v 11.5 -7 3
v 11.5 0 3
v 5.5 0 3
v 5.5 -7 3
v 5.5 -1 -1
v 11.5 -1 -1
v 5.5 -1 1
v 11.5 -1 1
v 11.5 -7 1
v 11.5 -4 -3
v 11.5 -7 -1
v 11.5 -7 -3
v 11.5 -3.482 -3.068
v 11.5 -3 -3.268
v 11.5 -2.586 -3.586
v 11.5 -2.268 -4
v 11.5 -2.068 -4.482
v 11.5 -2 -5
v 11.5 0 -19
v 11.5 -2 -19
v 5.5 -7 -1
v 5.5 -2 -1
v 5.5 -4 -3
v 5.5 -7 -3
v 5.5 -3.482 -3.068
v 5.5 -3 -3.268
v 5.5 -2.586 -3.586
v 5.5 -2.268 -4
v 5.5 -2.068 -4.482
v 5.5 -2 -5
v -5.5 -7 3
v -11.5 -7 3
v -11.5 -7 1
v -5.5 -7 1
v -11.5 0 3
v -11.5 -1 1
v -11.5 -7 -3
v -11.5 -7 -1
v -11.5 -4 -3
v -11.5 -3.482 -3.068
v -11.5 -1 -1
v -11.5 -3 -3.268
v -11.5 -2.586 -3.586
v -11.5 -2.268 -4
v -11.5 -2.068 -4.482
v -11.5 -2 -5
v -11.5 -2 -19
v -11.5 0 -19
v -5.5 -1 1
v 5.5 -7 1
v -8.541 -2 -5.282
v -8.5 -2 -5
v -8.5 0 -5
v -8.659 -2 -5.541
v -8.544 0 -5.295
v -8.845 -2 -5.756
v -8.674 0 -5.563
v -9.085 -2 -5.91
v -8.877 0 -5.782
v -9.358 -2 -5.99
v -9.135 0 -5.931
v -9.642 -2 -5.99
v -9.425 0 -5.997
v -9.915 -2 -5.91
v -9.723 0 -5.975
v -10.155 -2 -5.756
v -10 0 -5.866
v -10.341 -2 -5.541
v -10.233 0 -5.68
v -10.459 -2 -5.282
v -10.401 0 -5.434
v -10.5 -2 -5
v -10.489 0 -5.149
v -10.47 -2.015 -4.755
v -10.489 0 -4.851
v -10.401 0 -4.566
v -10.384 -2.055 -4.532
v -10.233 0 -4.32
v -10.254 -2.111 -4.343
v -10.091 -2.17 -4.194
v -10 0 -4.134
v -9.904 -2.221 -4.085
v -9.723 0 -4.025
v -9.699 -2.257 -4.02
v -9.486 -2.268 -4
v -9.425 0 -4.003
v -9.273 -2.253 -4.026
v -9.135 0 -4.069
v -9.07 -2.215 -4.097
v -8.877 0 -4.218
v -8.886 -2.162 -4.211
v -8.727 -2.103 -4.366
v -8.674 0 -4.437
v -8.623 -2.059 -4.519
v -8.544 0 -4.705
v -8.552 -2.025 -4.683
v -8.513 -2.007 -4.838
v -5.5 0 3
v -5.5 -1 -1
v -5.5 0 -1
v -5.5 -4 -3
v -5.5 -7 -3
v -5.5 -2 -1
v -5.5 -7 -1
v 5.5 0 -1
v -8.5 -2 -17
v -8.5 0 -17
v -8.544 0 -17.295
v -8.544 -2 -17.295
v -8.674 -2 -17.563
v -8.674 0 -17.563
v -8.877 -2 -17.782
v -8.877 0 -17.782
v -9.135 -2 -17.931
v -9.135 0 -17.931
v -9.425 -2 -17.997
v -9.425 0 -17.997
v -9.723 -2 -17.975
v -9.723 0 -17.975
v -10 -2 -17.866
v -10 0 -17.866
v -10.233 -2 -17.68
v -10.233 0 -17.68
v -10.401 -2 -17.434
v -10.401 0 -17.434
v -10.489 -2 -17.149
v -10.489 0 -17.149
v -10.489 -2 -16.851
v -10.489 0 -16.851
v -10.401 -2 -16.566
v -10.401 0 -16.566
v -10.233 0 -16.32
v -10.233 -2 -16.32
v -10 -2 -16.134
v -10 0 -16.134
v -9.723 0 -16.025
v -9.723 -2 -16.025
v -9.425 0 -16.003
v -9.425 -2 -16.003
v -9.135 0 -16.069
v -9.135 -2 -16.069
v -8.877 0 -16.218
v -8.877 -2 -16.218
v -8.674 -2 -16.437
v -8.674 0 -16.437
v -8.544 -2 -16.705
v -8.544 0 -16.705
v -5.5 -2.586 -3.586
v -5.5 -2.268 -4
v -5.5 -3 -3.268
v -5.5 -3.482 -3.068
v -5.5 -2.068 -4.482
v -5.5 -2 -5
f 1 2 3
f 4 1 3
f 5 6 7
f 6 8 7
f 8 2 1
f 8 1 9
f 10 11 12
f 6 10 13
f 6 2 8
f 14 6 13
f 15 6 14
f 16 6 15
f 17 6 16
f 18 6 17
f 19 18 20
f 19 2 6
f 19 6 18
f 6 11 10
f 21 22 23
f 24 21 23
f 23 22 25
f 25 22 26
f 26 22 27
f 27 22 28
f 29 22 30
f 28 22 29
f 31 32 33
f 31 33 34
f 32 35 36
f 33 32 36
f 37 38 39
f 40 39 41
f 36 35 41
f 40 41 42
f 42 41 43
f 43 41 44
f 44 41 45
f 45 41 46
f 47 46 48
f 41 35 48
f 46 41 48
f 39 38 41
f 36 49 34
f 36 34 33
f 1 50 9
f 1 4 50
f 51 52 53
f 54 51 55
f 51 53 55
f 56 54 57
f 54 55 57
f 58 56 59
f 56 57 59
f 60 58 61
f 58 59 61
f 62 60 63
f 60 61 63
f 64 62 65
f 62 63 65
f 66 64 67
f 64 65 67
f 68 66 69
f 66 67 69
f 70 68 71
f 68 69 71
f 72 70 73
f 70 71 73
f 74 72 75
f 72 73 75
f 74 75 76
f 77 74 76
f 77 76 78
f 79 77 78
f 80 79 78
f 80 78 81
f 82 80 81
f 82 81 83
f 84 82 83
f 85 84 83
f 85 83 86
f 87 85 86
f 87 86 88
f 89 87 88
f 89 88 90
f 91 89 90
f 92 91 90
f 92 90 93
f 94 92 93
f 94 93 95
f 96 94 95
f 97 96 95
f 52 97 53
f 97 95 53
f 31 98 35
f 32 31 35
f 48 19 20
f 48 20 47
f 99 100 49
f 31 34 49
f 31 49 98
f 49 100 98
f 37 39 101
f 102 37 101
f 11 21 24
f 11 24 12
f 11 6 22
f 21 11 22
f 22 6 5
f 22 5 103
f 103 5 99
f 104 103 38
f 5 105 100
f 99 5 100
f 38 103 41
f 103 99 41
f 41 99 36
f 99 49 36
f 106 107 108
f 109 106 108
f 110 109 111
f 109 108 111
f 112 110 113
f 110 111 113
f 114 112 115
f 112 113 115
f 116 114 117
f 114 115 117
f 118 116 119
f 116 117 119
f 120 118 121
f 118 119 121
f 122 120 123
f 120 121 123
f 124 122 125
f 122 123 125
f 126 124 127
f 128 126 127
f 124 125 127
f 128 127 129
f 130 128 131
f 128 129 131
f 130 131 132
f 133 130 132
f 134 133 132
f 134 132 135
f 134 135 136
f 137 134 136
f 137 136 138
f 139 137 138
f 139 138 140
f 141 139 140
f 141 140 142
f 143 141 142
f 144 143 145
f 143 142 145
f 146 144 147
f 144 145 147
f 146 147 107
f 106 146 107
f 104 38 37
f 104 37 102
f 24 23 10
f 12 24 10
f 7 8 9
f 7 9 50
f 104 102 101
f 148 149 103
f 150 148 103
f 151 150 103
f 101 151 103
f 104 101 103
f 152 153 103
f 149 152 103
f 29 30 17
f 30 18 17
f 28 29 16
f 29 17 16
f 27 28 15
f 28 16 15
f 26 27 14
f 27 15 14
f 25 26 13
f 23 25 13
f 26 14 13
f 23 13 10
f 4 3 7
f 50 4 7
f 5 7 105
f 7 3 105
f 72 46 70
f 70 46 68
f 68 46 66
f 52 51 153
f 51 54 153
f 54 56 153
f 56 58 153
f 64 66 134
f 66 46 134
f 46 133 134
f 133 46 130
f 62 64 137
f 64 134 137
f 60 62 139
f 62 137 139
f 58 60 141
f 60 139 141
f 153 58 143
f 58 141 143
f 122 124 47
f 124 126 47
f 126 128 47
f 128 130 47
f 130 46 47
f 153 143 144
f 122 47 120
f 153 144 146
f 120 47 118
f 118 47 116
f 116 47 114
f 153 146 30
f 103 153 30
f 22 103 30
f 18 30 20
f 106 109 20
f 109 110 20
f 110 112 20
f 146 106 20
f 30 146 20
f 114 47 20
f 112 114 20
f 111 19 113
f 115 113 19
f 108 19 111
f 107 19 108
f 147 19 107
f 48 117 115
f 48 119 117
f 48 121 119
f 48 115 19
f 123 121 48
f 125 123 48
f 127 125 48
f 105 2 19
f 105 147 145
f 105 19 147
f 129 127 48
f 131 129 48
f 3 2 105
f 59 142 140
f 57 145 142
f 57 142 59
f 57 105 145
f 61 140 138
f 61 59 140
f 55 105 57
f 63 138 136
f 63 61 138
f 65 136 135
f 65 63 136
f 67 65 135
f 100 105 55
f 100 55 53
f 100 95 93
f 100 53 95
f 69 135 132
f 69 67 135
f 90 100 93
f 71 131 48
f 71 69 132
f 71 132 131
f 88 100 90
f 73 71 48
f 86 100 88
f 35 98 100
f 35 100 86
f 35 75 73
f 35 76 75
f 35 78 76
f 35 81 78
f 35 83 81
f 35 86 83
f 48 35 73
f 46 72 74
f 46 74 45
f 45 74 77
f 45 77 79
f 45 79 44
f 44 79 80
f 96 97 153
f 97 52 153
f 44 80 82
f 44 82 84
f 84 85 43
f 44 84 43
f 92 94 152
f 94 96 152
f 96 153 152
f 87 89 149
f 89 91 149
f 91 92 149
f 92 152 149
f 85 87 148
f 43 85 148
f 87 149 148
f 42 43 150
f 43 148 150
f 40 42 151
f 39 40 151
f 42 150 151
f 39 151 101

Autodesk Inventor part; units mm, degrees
ref_plane "YZ Plane" through (0, 0, 0) normal (1, 0, 0) x (0, 1, 0)
ref_plane "XZ Plane" through (0, 0, 0) normal (0, 1, 0) x (-1, 0, 0)
ref_plane "XY Plane" through (0, 0, 0) normal (0, 0, 1) x (1, 0, 0)
sketch "Sketch1" plane through (0, 0, 0) normal (0, 1, 0) x (-1, 0, 0)
  line L0 (-5.5, -3) -> (-11.5, -3)
  line L1 (-11.5, -3) -> (-11.5, 3)
  line L2 (-11.5, 3) -> (-5.5, 3)
  line L3 (-5.5, 3) -> (-5.5, -3)
  line L4 (-5.5, -3) -> (-11.5, 3) construction
  line L5 (-11.5, -3) -> (-5.5, 3) construction
  line L6 (11.5, -3) -> (5.5, -3)
  line L7 (5.5, -3) -> (5.5, 3)
  line L8 (5.5, 3) -> (11.5, 3)
  line L9 (11.5, 3) -> (11.5, -3)
  line L10 (11.5, -3) -> (5.5, 3) construction
  line L11 (5.5, -3) -> (11.5, 3) construction
  point P0 (0, 0)
  point P1 (-8.5, 0)
  point P2 (8.5, 0)
  dimension "d0" = 6
  dimension "d1" = 6
  dimension "d2" = 0
  dimension "d3" = 5.5
  dimension "d4" = 6
  dimension "d5" = 6
  dimension "d7" = 11
extrude "Extrusion1" add sketch "Sketch1" against normal blind 1
sketch "Sketch2" plane through (0, -1, 0) normal (0, -1, 0) x (1, 0, 0)
  line L0 (-5.5, 3) -> (-11.5, 3) projected
  line L1 (-5.5, 3) -> (-5.5, -3) projected
  line L2 (-11.5, 3) -> (-5.5, 3)
  line L3 (-5.5, 3) -> (-5.5, 1)
  line L4 (-5.5, 1) -> (-11.5, 1)
  line L5 (-11.5, 1) -> (-11.5, 3)
  line L6 (-5.5, -3) -> (-11.5, -3) projected
  line L7 (-11.5, -3) -> (-5.5, -3)
  line L8 (-5.5, -3) -> (-5.5, -1)
  line L9 (-5.5, -1) -> (-11.5, -1)
  line L10 (-11.5, -1) -> (-11.5, -3)
  line L11 (5.5, 3) -> (5.5, -3) projected
  line L12 (11.5, -3) -> (11.5, 3) projected
  line L13 (5.5, 3) -> (11.5, 3)
  line L14 (11.5, 3) -> (11.5, 1)
  line L15 (11.5, 1) -> (5.5, 1)
  line L16 (5.5, 1) -> (5.5, 3)
  line L17 (5.5, -3) -> (11.5, -3) projected
  line L18 (5.5, -3) -> (11.5, -3)
  line L19 (11.5, -3) -> (11.5, -1)
  line L20 (11.5, -1) -> (5.5, -1)
  line L21 (5.5, -1) -> (5.5, -3)
  point P0 (0, 0)
  dimension "d10" = 2
  dimension "d11" = 2
extrude "Extrusion2" add sketch "Sketch2" along normal blind 6 contours L1 L4 L5 L0 | L1 L6 L10 L9 | L13 L12 L15 L11 | L20 L12 L17 L11
sketch "Sketch3" plane through (0, 0, 0) normal (0, 1, 0) x (1, 0, 0)
  line L0 (-11.5, 1) -> (-11.5, 3) projected
  line L1 (-11.5, 1) -> (11.5, 1)
  line L2 (11.5, 1) -> (11.5, 19)
  line L3 (11.5, 19) -> (-11.5, 19)
  line L4 (-11.5, 19) -> (-11.5, 1)
  line L5 (-5.5, 3) -> (-11.5, 3) projected
  circle A0 centre (-9.5, 17) radius 1
  circle A1 centre (-9.5, 5) radius 1
  point P0 (0, 0)
  dimension "d14" = 23
  dimension "d15" = 16
  dimension "d16" = 2
  dimension "d17" = 2
  dimension "d18" = 2
  dimension "d19" = 2
  dimension "d20" = 2
  dimension "d21" = 2
extrude "Extrusion3" add sketch "Sketch3" against normal blind 2
fillet "Fillet1" radius 2 2 edges at (-8.5, -2, -3) (8.5, -2, -3)
properties part number "sensor_3DPrint"
